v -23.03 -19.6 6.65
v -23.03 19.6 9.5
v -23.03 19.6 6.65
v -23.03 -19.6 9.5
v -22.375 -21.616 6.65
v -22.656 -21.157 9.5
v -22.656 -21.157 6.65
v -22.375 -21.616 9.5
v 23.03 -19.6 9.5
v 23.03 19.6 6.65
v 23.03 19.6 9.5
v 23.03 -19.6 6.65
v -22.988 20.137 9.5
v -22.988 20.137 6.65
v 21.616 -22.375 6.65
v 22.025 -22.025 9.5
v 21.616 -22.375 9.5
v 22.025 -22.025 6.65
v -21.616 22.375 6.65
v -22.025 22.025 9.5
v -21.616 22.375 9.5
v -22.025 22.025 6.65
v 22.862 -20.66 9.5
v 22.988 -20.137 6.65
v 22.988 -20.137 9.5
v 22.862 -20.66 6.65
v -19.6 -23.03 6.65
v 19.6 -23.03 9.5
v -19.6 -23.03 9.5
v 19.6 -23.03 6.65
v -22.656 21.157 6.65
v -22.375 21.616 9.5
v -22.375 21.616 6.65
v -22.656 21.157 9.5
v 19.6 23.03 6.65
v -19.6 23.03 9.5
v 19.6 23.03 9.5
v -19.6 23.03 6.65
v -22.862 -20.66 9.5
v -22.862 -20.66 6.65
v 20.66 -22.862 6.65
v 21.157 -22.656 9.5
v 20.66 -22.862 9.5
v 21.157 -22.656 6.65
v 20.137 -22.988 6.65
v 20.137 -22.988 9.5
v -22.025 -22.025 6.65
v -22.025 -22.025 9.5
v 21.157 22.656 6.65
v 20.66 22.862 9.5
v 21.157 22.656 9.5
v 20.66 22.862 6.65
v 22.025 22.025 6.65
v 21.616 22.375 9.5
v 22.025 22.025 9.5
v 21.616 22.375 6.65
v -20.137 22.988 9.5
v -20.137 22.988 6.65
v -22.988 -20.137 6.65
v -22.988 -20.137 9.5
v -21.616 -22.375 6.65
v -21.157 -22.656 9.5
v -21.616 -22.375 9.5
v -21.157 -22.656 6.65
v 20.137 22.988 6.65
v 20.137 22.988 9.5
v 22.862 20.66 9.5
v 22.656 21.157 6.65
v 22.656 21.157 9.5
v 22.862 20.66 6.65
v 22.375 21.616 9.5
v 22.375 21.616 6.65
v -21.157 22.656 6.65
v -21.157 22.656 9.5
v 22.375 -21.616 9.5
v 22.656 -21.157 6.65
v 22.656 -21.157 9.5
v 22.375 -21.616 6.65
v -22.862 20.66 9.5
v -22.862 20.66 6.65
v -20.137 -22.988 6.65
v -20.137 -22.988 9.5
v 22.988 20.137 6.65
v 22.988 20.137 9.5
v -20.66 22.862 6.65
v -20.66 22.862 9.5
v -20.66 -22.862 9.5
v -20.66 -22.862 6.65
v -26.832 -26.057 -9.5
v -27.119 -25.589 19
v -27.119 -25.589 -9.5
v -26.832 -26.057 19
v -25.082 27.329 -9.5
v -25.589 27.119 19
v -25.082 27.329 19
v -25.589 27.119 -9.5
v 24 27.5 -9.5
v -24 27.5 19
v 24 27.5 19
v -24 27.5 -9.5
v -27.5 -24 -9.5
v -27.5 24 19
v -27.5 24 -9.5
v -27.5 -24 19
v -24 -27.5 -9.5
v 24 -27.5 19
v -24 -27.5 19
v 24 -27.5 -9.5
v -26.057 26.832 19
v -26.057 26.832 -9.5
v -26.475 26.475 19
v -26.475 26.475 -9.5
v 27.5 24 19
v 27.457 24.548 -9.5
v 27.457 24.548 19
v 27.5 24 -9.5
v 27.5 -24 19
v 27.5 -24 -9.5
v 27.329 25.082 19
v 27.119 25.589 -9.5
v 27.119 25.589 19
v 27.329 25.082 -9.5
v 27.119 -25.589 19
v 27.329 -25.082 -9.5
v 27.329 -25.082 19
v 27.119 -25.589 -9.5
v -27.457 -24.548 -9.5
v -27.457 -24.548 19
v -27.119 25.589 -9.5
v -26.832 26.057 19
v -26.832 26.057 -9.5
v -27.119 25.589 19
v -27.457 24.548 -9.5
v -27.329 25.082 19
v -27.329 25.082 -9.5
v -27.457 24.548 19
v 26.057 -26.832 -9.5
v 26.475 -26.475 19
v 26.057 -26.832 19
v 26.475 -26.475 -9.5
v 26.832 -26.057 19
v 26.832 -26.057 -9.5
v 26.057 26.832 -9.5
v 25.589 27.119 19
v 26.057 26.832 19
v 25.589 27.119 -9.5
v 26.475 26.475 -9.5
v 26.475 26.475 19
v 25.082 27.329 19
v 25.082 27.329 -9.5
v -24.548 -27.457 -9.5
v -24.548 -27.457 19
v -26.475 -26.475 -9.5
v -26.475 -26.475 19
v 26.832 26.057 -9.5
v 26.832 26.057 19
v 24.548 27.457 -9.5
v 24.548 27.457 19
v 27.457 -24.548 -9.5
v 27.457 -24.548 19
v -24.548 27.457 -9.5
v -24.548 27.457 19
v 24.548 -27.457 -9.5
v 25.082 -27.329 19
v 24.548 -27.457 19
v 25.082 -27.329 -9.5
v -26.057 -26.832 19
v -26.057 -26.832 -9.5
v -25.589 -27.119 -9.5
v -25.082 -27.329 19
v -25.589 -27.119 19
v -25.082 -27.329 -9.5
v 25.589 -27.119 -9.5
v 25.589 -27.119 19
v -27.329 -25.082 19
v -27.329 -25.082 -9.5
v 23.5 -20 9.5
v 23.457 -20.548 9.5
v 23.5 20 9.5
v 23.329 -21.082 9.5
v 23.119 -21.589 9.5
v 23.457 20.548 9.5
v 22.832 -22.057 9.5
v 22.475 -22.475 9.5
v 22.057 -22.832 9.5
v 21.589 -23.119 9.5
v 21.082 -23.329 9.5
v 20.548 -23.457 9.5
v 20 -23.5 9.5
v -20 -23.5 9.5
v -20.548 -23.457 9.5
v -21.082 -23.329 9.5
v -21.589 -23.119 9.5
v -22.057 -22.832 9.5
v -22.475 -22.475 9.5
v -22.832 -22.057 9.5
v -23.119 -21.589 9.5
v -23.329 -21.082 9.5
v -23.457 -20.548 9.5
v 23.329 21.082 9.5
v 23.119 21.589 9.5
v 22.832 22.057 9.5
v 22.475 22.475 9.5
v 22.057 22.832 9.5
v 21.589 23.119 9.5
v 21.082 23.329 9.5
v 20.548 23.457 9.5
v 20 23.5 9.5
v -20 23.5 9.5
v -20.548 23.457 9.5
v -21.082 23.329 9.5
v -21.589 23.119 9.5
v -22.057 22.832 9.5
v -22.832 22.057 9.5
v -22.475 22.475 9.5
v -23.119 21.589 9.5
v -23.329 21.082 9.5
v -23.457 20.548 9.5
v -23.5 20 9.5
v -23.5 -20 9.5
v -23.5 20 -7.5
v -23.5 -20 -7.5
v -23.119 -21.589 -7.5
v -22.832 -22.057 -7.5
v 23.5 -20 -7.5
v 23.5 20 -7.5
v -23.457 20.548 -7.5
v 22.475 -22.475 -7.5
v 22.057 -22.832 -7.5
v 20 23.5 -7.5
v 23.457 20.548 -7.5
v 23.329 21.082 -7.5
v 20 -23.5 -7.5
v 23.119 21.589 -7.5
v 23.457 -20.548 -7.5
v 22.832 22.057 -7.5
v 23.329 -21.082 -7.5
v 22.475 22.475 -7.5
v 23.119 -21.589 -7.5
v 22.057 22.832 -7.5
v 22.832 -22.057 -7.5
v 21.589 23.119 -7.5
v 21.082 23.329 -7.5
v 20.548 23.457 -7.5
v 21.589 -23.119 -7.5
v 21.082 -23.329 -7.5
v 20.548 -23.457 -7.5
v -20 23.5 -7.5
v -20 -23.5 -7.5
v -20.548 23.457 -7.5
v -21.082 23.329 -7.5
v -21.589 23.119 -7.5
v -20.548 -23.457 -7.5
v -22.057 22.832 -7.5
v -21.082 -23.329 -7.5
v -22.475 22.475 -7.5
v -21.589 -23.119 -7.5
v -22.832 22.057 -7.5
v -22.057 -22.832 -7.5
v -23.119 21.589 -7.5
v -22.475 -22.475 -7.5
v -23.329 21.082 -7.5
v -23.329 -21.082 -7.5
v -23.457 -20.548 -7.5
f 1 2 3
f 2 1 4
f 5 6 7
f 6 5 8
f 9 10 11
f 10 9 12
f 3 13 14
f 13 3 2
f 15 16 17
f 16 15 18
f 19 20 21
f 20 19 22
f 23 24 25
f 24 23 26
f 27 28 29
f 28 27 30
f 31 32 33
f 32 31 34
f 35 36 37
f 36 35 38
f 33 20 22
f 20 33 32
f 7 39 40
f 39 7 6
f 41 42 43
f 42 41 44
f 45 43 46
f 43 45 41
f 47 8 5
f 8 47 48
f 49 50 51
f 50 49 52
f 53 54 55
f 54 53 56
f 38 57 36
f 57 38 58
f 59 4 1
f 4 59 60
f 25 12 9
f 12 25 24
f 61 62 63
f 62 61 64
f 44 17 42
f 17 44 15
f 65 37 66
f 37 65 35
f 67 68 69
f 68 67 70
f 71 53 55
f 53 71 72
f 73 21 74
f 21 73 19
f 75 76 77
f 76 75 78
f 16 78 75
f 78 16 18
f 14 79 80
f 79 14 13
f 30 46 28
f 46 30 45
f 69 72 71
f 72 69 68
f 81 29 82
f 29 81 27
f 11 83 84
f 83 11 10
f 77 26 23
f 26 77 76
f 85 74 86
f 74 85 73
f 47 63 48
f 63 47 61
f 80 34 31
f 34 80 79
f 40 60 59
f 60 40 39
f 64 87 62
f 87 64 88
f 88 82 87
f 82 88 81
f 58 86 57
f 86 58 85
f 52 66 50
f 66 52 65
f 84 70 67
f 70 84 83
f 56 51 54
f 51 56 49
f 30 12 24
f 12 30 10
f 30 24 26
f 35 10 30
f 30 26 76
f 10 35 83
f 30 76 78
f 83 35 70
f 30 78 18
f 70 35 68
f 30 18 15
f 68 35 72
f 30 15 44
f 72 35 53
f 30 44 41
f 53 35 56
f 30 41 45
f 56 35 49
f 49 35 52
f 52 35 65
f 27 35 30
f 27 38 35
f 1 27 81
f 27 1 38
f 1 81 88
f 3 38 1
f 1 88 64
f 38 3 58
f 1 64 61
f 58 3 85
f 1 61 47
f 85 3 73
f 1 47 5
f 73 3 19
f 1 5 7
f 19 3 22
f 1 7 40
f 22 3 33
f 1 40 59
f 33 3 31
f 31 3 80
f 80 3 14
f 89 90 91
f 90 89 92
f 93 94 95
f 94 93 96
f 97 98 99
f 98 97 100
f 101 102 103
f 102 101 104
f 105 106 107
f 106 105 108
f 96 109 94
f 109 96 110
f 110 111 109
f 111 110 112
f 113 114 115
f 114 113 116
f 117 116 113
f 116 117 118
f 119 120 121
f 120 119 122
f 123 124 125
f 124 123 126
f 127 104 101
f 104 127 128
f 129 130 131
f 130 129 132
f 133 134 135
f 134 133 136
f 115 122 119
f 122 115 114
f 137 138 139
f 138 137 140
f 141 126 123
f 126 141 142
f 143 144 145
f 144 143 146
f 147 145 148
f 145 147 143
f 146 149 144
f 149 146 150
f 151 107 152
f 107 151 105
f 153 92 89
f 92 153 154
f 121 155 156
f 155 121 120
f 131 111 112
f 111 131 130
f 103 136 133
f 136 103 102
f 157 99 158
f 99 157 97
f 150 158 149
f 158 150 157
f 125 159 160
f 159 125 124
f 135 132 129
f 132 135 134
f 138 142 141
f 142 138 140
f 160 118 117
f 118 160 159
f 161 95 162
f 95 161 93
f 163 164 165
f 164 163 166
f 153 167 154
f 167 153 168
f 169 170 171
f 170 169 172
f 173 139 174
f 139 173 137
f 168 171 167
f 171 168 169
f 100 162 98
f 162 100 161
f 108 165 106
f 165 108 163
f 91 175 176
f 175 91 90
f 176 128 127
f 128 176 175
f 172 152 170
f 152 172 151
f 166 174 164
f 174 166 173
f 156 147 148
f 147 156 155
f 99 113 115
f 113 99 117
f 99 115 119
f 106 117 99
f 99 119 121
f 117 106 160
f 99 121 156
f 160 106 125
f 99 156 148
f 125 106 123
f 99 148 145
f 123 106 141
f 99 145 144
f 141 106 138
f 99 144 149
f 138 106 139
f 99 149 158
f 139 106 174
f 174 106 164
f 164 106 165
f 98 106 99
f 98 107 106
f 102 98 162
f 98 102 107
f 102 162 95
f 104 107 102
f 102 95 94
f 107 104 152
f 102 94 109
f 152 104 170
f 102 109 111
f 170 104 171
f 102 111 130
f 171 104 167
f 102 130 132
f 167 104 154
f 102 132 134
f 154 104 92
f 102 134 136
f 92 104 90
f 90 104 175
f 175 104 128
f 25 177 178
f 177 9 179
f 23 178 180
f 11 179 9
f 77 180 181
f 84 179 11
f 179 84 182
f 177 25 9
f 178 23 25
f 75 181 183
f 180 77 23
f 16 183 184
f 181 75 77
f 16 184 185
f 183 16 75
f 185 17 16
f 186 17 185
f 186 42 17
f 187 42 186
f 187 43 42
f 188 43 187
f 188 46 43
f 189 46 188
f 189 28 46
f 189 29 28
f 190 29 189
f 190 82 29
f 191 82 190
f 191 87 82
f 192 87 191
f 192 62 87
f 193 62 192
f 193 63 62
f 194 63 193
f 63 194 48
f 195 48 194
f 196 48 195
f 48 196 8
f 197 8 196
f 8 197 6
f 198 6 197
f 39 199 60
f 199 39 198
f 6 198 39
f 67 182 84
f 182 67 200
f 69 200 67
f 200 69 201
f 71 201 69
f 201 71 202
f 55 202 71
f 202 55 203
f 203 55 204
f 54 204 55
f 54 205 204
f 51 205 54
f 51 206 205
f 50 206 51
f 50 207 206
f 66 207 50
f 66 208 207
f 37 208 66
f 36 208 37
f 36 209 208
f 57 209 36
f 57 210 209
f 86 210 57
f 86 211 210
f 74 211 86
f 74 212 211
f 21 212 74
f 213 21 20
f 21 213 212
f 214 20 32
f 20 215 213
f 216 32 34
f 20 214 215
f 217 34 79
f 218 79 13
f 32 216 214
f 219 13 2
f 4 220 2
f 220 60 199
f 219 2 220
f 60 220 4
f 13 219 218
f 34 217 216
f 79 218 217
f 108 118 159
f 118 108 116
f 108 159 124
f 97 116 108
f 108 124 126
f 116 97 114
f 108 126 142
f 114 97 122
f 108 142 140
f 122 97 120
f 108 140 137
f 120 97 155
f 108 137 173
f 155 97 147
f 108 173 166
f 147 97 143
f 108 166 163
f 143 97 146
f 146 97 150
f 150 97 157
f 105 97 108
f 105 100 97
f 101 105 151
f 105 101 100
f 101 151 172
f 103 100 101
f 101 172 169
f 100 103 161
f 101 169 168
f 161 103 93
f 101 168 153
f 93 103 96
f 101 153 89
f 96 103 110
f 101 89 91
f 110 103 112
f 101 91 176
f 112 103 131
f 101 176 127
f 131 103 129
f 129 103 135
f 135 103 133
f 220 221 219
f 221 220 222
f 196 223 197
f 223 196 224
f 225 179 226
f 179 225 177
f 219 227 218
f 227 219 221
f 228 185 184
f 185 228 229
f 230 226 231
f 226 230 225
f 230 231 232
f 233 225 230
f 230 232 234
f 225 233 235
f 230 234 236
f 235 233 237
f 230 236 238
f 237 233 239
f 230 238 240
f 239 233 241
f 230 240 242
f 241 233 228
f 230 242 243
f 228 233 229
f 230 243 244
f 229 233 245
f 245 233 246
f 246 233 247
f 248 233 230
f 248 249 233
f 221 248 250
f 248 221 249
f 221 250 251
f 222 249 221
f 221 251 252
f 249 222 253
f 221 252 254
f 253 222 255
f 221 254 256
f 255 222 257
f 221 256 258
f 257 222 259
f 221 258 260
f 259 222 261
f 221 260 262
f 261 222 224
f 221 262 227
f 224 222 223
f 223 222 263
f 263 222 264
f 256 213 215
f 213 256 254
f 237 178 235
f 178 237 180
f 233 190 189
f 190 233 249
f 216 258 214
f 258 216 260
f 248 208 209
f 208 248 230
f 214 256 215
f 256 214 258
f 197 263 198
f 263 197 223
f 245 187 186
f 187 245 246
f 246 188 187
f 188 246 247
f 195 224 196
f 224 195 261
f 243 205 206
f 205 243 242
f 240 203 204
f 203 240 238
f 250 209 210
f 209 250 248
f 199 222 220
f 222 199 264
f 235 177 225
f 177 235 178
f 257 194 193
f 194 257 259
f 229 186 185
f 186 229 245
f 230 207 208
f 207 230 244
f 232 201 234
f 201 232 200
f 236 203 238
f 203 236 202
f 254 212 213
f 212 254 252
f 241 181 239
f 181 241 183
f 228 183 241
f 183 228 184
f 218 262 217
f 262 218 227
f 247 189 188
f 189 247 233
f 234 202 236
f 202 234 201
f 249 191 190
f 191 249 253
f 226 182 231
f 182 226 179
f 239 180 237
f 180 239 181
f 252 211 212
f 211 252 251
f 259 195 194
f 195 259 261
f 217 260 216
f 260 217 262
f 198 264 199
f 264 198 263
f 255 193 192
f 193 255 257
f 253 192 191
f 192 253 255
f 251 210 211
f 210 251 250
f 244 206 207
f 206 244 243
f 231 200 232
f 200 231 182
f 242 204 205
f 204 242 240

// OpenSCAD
$fn = 40;

outside_radius = 3.5;
wall_thickness = 4;
floor_thickness = 2;

base_height = 19;
base_width = 55;

lid_height = base_height/2;

show_lid = true;
show_base = true;

module block(width, radius, height) {
    c_distance = width / 2 - radius;
    c_distances = [c_distance, -c_distance];
    hull() {
        for(x = c_distances) {
            for(y = c_distances) {
                translate([x, y, 0]) {
                    cylinder(h = height, r = radius, center = true);
                }
            }
        }
    }
}

module base_block() {
    block(base_width, outside_radius, base_height);
};

module cutout() {
    translate([0, 0, floor_thickness]) {
        block(base_width - 2 * wall_thickness, outside_radius, base_height);
    }
}
    

module base() {
    difference() {
        base_block();
        cutout();
    }
}

module lid() {
    lid_fit = 0.98;
    
    block(base_width, outside_radius, lid_height);
    difference() {
        translate([0, 0, -base_height/2]) scale([lid_fit, lid_fit]) cutout();
        translate([0, 0, -base_height * 0.9]) base_block();
    }
}

if (show_lid) translate([0, 0, base_height/2 + lid_height/2]) lid();

if (show_base) #base();
